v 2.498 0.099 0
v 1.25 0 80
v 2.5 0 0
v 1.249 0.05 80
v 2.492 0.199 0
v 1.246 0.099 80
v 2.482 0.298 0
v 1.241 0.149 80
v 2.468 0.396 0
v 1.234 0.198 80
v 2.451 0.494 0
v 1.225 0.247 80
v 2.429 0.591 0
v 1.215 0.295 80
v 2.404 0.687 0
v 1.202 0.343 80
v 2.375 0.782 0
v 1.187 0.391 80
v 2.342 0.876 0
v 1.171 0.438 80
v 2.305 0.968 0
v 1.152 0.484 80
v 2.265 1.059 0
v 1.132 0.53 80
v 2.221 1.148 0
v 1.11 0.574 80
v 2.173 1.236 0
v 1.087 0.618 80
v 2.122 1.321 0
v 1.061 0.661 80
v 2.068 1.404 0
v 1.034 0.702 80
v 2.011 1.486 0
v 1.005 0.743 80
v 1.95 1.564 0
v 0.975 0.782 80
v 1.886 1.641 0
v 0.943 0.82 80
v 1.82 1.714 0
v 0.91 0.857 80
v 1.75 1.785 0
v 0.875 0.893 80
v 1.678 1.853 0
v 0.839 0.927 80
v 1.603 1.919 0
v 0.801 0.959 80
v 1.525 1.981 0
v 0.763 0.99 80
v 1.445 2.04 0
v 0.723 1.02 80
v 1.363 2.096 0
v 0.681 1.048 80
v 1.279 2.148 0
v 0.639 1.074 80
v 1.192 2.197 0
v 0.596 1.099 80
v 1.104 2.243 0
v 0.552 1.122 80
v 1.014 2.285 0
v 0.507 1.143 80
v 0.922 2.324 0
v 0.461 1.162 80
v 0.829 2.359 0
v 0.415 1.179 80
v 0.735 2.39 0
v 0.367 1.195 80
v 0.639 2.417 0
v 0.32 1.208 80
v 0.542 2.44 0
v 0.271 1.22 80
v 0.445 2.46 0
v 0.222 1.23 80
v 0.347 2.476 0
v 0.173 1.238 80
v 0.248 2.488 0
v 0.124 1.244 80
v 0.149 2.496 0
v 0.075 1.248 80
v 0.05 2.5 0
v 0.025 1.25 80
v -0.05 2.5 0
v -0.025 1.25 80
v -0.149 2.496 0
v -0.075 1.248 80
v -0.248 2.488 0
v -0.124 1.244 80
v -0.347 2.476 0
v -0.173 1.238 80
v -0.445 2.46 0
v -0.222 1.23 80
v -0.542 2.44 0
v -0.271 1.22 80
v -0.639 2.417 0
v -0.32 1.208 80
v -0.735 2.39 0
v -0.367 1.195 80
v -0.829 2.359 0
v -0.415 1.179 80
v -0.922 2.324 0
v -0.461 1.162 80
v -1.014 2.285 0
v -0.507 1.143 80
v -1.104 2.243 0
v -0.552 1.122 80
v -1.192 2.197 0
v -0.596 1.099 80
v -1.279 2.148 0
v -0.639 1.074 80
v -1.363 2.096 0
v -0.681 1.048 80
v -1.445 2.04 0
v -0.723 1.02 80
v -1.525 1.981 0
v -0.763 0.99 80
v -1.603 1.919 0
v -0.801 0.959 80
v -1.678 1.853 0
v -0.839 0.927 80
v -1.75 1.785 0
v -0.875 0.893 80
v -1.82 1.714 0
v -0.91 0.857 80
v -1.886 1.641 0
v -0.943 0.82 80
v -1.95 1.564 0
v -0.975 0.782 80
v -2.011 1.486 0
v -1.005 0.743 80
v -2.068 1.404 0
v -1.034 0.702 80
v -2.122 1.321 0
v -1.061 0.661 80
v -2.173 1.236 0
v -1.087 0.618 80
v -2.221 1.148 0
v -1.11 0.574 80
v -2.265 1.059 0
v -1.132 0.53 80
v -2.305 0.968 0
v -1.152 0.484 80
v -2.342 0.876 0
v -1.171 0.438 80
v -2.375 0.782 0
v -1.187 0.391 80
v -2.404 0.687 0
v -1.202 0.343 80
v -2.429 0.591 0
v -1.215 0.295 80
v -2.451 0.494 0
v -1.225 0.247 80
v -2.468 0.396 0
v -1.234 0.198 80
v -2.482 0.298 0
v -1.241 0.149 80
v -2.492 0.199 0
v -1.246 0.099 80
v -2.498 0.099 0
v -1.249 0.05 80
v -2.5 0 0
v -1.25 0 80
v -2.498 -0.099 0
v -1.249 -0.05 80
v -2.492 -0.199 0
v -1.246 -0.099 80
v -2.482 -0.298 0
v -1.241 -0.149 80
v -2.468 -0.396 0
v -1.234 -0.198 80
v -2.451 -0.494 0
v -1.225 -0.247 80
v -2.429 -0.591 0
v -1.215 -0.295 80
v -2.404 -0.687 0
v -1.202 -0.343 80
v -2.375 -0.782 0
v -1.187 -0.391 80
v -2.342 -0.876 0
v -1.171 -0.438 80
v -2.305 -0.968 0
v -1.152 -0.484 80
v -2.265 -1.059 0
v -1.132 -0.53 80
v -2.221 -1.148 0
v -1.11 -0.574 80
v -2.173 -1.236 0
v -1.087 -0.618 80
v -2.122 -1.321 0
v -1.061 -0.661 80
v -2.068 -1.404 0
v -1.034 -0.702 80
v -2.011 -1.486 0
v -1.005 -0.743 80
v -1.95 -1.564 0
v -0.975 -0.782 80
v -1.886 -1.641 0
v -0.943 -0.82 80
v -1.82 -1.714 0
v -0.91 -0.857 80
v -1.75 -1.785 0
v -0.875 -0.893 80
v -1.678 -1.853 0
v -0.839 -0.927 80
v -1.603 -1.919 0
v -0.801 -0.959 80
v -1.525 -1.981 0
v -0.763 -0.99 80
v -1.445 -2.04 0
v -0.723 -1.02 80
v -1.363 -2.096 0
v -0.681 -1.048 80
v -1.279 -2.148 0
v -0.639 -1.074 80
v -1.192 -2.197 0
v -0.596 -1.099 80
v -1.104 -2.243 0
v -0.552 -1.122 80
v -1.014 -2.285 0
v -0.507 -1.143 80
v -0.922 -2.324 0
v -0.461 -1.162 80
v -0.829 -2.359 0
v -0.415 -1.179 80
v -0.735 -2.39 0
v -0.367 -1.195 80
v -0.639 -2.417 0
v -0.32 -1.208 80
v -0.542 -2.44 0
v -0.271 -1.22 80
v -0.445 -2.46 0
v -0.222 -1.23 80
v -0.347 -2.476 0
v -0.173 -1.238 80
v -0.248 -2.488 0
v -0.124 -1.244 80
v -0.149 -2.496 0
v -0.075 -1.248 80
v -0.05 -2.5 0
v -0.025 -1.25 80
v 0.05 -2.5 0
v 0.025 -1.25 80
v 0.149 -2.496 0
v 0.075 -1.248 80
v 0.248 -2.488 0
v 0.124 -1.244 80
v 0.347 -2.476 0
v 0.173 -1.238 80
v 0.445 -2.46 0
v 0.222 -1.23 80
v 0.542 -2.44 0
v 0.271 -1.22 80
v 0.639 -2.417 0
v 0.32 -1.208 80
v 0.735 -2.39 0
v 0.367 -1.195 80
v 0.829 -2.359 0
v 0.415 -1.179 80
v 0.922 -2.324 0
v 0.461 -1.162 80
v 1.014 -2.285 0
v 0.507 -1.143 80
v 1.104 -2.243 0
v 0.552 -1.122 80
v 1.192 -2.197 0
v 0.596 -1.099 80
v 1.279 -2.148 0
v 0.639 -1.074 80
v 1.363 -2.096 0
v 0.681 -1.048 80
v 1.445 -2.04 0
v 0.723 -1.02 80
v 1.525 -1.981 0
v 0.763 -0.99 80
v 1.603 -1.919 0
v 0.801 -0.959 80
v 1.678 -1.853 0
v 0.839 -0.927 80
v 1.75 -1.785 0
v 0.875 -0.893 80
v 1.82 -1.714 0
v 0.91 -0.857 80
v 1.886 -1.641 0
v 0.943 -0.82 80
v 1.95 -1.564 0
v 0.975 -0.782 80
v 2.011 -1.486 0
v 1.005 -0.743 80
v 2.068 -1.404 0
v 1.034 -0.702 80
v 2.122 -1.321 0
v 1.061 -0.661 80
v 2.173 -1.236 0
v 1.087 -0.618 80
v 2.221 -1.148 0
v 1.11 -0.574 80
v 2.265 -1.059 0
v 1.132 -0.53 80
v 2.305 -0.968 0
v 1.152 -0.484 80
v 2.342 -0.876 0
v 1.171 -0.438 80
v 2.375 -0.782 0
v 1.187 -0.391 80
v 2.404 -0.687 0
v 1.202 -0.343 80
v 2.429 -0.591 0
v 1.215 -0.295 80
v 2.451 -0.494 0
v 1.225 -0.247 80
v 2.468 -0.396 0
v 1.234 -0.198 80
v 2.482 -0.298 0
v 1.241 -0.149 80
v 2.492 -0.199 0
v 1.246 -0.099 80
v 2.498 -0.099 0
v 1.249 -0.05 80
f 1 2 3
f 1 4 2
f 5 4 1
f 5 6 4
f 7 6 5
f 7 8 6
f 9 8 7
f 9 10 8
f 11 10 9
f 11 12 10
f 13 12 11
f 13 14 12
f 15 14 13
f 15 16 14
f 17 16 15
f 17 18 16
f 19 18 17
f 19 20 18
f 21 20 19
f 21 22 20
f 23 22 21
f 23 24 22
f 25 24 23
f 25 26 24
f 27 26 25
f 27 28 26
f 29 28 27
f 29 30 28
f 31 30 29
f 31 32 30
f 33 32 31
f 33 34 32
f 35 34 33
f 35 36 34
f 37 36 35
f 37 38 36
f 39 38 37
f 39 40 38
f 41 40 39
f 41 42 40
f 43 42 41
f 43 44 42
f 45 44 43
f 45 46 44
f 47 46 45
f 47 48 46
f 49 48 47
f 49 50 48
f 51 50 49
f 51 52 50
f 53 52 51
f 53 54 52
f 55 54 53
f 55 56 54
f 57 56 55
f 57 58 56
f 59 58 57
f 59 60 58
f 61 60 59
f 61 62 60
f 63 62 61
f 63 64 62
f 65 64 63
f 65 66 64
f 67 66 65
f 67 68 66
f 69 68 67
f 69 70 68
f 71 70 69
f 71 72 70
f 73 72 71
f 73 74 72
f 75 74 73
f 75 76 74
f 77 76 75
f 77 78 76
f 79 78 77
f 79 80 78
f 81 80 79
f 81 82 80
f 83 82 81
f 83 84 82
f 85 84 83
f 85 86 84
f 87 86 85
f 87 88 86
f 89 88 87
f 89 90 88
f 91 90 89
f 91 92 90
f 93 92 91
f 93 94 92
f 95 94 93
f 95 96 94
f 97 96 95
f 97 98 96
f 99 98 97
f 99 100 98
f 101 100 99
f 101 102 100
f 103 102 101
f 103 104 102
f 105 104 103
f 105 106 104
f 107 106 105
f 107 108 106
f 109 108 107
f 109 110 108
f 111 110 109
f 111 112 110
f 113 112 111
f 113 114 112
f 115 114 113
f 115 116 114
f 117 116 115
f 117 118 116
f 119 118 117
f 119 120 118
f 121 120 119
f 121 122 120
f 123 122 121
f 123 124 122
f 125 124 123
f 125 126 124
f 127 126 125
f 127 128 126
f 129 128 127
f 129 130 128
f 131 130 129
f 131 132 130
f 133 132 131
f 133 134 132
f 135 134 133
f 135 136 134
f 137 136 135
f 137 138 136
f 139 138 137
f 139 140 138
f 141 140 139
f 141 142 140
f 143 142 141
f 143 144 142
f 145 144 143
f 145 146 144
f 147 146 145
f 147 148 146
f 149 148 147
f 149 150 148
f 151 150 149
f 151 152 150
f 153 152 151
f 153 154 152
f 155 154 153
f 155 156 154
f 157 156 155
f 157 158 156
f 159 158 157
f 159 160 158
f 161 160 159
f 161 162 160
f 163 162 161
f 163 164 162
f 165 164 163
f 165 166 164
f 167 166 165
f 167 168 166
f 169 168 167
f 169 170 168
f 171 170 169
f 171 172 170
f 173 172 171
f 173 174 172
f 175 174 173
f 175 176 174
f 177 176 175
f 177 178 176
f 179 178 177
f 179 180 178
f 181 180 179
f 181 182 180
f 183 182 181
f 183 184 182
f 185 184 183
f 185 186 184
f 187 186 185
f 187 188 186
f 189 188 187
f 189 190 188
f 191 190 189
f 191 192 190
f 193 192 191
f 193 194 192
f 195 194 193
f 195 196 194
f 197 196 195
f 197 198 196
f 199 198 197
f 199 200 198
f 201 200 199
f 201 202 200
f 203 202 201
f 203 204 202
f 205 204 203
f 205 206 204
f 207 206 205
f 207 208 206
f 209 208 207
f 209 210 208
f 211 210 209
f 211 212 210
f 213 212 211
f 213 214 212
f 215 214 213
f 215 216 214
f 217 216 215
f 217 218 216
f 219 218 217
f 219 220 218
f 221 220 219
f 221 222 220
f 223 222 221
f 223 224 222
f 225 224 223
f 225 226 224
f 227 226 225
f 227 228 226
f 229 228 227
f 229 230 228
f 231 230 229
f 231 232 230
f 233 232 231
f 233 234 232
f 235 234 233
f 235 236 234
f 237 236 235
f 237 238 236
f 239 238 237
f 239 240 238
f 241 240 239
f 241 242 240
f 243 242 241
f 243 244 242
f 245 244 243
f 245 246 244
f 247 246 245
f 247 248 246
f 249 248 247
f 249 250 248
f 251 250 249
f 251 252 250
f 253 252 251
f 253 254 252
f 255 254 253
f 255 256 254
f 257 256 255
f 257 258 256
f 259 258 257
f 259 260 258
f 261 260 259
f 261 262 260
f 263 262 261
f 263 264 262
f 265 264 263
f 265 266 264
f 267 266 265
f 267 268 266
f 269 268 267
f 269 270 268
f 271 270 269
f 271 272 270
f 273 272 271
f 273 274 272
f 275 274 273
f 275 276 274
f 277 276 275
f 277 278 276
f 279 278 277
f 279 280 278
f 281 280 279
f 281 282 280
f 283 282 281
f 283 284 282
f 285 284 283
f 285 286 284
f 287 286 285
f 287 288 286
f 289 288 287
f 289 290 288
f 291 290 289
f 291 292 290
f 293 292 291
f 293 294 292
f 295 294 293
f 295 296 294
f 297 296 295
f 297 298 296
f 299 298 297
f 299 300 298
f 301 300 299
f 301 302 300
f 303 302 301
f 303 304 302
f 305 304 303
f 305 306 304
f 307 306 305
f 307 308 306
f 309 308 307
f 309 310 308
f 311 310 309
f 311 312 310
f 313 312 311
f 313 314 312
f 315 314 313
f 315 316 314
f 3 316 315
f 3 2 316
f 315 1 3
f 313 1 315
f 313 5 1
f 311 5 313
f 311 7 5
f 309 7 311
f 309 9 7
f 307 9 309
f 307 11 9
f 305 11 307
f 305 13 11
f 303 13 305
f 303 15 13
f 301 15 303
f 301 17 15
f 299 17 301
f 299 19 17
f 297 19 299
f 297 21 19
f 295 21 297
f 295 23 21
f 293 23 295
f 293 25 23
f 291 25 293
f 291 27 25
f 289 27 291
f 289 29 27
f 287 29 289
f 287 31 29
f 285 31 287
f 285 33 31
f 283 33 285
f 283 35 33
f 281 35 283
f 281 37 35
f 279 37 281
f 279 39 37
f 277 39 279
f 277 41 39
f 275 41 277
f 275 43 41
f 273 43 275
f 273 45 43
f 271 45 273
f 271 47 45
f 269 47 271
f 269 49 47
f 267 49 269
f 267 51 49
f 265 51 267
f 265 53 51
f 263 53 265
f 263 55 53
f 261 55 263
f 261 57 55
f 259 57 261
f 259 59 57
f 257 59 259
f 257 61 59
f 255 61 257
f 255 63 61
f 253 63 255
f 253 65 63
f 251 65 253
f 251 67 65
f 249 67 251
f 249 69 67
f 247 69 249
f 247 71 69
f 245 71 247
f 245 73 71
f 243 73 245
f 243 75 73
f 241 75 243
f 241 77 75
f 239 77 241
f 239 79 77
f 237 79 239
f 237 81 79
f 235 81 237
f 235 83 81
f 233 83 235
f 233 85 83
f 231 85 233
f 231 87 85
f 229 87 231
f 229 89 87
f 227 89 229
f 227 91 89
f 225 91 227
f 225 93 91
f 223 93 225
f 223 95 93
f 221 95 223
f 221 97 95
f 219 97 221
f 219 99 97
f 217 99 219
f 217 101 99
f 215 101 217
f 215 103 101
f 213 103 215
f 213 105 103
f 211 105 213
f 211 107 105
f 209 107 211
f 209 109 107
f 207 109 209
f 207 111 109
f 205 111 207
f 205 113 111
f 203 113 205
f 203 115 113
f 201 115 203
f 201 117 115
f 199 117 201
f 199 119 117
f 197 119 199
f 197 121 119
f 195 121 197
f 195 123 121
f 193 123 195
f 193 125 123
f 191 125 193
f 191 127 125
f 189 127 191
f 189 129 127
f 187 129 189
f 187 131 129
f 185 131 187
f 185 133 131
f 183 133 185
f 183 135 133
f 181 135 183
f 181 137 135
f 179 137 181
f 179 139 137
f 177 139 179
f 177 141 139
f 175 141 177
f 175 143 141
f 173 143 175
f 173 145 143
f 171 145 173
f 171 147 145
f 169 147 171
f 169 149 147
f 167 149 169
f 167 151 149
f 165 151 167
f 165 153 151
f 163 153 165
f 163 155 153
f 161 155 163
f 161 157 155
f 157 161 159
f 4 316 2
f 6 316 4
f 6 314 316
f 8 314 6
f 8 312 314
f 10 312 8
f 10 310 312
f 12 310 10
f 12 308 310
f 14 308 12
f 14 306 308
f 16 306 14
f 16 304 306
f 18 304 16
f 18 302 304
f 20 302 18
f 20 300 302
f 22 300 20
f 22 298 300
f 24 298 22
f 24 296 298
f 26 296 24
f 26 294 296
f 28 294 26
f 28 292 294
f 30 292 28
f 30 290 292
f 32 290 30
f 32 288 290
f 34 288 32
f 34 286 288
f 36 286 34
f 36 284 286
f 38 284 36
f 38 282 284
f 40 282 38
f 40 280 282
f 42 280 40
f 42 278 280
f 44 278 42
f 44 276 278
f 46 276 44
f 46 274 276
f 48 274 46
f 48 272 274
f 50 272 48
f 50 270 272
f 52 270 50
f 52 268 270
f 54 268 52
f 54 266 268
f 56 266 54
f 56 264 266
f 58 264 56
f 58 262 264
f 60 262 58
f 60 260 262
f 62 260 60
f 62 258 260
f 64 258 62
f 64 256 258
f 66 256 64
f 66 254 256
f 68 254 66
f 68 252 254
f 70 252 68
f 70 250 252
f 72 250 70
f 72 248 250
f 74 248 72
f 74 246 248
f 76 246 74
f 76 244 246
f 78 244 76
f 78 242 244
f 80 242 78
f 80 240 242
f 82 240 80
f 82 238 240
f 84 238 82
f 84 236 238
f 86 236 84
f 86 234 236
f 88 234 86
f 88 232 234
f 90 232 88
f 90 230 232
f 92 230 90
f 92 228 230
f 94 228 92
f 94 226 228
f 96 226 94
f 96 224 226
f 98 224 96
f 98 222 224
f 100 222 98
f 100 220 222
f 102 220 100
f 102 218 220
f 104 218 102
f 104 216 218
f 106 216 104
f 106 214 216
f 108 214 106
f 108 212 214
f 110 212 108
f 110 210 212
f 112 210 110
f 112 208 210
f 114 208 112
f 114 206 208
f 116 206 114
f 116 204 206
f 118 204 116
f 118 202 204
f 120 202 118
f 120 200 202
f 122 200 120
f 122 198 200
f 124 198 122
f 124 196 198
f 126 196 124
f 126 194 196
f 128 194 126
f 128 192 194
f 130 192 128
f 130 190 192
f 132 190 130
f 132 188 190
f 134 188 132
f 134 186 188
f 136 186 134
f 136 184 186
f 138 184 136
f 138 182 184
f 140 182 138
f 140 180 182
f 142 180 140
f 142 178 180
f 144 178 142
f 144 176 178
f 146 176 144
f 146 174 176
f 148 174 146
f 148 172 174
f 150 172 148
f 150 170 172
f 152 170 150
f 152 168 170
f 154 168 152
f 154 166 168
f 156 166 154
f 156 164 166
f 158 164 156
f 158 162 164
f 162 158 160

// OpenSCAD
$fa=0.1;
$fs=0.1;

// Base diameter (mm)
diameter_base = 5.0;

// Top diameter (mm)
diameter_top = 2.5;

// Height (mm)
height = 80;

cone(r1=diameter_base/2.0, r2=diameter_top/2.0, h=height);

module cone(r1, r2, h) {
    cylinder(r1=r1, r2=r2, h=h);
}
